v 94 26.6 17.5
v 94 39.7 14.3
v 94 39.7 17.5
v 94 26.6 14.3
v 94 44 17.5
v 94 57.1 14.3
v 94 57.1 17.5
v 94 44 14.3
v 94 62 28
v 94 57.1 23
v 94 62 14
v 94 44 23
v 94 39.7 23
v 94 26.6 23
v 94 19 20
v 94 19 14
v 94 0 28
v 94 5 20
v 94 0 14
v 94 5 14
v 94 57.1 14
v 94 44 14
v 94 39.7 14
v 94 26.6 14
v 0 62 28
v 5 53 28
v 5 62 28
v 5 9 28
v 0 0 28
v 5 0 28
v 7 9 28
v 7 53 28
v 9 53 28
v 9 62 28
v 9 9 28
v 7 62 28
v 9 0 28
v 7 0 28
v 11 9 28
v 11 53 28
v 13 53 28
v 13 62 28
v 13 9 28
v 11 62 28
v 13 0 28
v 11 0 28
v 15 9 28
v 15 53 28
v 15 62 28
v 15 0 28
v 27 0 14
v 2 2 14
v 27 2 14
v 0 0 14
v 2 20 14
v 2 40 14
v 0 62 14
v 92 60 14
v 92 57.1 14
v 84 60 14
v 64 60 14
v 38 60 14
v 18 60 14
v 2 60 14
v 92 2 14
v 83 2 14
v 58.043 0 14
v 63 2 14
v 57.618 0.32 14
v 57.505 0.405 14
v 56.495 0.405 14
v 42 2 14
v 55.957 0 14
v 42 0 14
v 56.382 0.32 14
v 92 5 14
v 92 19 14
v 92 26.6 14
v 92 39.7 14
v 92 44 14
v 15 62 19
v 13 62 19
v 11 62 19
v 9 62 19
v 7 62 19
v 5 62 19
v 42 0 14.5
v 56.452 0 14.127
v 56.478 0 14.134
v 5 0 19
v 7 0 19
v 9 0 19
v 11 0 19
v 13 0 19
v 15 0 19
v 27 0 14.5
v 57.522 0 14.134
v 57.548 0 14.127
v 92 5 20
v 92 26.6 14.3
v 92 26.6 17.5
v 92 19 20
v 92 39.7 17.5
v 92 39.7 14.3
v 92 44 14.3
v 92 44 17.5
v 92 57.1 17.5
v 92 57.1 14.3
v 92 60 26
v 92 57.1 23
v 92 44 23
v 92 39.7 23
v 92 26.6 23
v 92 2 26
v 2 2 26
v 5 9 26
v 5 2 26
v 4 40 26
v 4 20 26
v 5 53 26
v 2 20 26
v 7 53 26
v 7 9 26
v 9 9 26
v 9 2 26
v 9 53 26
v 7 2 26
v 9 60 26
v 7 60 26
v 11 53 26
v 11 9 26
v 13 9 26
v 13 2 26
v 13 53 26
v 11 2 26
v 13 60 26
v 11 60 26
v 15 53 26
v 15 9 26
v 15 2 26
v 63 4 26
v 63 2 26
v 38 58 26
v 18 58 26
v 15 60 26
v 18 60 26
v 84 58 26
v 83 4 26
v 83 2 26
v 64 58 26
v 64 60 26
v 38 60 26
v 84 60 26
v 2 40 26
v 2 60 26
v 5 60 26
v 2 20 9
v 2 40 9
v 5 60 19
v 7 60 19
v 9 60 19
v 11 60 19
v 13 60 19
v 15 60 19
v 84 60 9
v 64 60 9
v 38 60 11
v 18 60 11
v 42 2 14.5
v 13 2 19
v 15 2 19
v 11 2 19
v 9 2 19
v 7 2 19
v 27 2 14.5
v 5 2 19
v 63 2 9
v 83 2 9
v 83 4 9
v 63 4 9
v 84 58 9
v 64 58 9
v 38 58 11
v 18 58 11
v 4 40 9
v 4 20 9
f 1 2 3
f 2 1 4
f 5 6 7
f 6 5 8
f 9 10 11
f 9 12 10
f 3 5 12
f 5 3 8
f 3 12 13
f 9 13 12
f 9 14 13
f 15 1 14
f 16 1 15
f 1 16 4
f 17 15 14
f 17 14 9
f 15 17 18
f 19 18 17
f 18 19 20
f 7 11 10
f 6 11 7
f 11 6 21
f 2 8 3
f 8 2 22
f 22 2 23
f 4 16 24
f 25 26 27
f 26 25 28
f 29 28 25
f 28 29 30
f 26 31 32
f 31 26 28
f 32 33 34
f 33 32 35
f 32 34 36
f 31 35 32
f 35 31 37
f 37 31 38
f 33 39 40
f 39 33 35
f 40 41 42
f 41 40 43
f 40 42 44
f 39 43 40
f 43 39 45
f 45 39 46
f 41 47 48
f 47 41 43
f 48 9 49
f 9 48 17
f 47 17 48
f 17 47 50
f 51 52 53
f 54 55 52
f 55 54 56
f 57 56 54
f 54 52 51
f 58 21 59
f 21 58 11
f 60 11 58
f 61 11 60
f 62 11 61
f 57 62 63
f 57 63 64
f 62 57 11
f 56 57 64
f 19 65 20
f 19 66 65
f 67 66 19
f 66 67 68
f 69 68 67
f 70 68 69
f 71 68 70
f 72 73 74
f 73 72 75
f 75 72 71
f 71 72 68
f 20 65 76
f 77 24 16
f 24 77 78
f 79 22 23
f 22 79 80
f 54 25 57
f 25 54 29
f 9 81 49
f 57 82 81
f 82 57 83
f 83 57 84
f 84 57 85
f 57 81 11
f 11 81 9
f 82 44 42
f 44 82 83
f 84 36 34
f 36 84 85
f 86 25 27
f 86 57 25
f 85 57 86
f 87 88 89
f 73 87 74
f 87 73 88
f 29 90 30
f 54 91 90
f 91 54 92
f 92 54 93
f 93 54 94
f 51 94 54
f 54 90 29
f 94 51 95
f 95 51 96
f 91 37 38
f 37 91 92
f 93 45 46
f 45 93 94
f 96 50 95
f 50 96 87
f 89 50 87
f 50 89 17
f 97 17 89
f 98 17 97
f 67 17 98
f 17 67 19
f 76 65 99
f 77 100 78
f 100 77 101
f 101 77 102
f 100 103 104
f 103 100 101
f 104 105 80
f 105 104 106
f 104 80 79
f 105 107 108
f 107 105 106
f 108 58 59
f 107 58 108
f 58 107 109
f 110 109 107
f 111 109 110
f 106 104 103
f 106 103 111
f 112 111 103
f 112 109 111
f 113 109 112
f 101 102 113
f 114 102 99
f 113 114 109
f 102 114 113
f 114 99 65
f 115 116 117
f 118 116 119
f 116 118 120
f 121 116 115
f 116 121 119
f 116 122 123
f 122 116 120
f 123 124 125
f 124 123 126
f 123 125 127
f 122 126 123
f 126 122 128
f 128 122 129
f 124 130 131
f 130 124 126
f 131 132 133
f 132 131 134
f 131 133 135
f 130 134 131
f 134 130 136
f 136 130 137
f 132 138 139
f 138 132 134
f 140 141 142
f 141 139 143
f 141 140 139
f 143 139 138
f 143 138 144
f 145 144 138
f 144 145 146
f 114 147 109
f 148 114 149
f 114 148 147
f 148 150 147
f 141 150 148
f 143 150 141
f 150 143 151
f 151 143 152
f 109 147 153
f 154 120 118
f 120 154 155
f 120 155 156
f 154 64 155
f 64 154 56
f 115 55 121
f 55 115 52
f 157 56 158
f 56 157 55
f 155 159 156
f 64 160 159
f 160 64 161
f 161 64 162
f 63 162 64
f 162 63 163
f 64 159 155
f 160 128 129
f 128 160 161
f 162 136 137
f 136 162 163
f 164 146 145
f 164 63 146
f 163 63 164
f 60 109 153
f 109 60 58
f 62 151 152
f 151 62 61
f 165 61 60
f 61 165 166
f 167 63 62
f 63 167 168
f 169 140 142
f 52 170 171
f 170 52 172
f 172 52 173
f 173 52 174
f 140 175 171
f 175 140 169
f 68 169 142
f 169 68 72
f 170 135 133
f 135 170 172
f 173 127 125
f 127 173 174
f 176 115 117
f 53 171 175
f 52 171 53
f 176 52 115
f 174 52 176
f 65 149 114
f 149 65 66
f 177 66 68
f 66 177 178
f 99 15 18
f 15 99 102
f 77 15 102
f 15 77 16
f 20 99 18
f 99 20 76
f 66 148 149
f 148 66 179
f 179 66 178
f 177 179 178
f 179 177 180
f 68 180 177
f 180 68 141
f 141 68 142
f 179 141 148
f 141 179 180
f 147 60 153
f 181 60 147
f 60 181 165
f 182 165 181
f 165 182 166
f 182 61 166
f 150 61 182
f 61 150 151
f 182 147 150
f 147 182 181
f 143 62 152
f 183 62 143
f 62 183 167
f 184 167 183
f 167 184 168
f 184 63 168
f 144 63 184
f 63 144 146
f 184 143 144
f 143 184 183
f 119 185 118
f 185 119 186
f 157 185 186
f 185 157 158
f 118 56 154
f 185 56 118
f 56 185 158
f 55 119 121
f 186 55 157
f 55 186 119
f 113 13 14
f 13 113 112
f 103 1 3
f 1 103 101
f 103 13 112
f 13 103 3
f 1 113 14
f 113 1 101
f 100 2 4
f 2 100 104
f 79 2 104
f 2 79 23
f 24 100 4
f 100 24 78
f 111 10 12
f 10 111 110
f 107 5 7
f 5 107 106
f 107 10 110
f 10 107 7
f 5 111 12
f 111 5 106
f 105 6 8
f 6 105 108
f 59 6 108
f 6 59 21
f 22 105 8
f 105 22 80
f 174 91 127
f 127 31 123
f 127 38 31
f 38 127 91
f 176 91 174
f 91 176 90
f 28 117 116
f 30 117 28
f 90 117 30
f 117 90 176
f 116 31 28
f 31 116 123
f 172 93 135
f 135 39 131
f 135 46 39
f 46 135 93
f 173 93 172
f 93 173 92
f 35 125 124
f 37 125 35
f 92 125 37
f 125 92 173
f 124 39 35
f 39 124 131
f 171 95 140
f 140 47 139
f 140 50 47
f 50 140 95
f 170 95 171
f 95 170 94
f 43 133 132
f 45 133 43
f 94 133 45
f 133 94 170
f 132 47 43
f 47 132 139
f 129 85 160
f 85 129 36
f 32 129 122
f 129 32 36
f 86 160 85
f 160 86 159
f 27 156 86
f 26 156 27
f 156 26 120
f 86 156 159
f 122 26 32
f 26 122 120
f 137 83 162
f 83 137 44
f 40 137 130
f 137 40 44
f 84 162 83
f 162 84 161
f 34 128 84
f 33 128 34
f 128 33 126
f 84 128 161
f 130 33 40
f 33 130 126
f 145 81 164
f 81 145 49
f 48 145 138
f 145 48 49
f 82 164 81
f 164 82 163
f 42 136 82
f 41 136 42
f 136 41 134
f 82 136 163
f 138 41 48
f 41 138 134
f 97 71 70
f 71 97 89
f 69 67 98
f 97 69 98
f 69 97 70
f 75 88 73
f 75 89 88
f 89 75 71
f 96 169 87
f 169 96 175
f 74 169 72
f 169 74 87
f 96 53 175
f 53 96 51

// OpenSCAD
//based on http://www.thingiverse.com/thing:47270
//adapted for model B+

width = 60.5;
length = 90.0;
thickness = 2;

total_height = 28;

// Raspberry PI
*translate([43.4+thickness,28.5+thickness,6.5]) {
	import("../RaspberryPi_B.stl");
}

// ----- Modules -----//

// Base box
module basebox() {
	difference() {
		cube([length+(thickness*2),(width+(thickness*2))-2.5,14]);
		
		translate ([thickness, thickness, thickness]) {
			cube([length,width-2.5,28]);
		}
	}
}
//basebox();

// Top box
module topbox() {
	translate([0,0,14]) {
		difference() {
			cube([length+(thickness*2),(width+(thickness*2))-2.5,14]);
			
			translate ([thickness, thickness, -thickness]) {
				cube([length,width-2.5,14]);
			}
		}
	}
}


// Hole - Digital
module digital() { //<-- moved for B+
	translate ([57,-0.1,10]) { //pos=70
		rotate([-90,90,0]) cylinder(3,4.2,3.2,$fn=25);
	}
}


// Hole - HDMI
module hdmi() {
	translate ([27,-1,10.5]) {
		hull(){
		cube([15,4,4]);
		translate([2.5,0,-2.5]) cube([10,4,1]);
		}
	}
}

// Hole - Ethernet
module ethernet() {
	union() {
	translate ([length,5,11.5]) cube([5,14,8.5]);
	translate ([length,8.5,9.7]) cube([5,7,2]);
	translate ([length,9.5,8.5]) cube([5,5,2]);
	}
}


// Hole - USB
module usb() {
	translate ([length,26.6,17.5]) cube([5,13.1,5.5]);
	translate ([length,26.6,8.8]) cube([5,13.1,5.5]);
	translate ([length,44,17.5]) cube([5,13.1,5.5]); //<-- added for B+
	translate ([length,44,8.8]) cube([5,13.1,5.5]); //<-- added for B+
}


// Hole - Power
module power() { //<-- rotated and repositioned for B+
	rotate([0,0,90]){ 
		hull() {
			translate ([-1,-17,9]) cube([4,7.9,2]);
			translate ([-1,-16,8]) cube([4,5.9,.2]);
		}
	}	
}
//power();
// Hole - SD Card
module sdcard() {
	translate ([-1,24,3]) cube([8,14,3.5]); //<-- changed for B+ sd -> microsd (28->14)
}



// Ventilation
module vents() {
  cube([2,10,10]);
  translate([4,0,0]) cube([2,10,10]);
  translate([8,0,0]) cube([2,10,10]);
}


// Elements //

*difference() {
	union() {
		difference() {
			basebox();
			ethernet();
			
		}
	translate ([2,58,2]) cube([20,2,4]);
	translate ([2,2,2]) cube([20,2,4]);
	translate ([66,58,2]) cube([20,2,4]);
	translate ([59,2,2]) cube([20,2,4]);
	}

	digital();
	hdmi();
	usb();
	power();
	sdcard();
}

difference() {
	union() {
		difference() {
			topbox();
			ethernet();
		}
	translate ([63,2,9]) cube([20,2,17]);
	//translate ([18,2,9]) cube([20,2,17]);
	translate ([64,58,9]) cube([20,2,17]);
	translate ([18,58,11]) cube([20,2,15]);
	translate ([2,20,9]) cube([2,20,17]);
	}

	digital();
	hdmi();
	usb();
	translate([5,-1,19]) vents();
	translate([5,53,19]) vents();
}
